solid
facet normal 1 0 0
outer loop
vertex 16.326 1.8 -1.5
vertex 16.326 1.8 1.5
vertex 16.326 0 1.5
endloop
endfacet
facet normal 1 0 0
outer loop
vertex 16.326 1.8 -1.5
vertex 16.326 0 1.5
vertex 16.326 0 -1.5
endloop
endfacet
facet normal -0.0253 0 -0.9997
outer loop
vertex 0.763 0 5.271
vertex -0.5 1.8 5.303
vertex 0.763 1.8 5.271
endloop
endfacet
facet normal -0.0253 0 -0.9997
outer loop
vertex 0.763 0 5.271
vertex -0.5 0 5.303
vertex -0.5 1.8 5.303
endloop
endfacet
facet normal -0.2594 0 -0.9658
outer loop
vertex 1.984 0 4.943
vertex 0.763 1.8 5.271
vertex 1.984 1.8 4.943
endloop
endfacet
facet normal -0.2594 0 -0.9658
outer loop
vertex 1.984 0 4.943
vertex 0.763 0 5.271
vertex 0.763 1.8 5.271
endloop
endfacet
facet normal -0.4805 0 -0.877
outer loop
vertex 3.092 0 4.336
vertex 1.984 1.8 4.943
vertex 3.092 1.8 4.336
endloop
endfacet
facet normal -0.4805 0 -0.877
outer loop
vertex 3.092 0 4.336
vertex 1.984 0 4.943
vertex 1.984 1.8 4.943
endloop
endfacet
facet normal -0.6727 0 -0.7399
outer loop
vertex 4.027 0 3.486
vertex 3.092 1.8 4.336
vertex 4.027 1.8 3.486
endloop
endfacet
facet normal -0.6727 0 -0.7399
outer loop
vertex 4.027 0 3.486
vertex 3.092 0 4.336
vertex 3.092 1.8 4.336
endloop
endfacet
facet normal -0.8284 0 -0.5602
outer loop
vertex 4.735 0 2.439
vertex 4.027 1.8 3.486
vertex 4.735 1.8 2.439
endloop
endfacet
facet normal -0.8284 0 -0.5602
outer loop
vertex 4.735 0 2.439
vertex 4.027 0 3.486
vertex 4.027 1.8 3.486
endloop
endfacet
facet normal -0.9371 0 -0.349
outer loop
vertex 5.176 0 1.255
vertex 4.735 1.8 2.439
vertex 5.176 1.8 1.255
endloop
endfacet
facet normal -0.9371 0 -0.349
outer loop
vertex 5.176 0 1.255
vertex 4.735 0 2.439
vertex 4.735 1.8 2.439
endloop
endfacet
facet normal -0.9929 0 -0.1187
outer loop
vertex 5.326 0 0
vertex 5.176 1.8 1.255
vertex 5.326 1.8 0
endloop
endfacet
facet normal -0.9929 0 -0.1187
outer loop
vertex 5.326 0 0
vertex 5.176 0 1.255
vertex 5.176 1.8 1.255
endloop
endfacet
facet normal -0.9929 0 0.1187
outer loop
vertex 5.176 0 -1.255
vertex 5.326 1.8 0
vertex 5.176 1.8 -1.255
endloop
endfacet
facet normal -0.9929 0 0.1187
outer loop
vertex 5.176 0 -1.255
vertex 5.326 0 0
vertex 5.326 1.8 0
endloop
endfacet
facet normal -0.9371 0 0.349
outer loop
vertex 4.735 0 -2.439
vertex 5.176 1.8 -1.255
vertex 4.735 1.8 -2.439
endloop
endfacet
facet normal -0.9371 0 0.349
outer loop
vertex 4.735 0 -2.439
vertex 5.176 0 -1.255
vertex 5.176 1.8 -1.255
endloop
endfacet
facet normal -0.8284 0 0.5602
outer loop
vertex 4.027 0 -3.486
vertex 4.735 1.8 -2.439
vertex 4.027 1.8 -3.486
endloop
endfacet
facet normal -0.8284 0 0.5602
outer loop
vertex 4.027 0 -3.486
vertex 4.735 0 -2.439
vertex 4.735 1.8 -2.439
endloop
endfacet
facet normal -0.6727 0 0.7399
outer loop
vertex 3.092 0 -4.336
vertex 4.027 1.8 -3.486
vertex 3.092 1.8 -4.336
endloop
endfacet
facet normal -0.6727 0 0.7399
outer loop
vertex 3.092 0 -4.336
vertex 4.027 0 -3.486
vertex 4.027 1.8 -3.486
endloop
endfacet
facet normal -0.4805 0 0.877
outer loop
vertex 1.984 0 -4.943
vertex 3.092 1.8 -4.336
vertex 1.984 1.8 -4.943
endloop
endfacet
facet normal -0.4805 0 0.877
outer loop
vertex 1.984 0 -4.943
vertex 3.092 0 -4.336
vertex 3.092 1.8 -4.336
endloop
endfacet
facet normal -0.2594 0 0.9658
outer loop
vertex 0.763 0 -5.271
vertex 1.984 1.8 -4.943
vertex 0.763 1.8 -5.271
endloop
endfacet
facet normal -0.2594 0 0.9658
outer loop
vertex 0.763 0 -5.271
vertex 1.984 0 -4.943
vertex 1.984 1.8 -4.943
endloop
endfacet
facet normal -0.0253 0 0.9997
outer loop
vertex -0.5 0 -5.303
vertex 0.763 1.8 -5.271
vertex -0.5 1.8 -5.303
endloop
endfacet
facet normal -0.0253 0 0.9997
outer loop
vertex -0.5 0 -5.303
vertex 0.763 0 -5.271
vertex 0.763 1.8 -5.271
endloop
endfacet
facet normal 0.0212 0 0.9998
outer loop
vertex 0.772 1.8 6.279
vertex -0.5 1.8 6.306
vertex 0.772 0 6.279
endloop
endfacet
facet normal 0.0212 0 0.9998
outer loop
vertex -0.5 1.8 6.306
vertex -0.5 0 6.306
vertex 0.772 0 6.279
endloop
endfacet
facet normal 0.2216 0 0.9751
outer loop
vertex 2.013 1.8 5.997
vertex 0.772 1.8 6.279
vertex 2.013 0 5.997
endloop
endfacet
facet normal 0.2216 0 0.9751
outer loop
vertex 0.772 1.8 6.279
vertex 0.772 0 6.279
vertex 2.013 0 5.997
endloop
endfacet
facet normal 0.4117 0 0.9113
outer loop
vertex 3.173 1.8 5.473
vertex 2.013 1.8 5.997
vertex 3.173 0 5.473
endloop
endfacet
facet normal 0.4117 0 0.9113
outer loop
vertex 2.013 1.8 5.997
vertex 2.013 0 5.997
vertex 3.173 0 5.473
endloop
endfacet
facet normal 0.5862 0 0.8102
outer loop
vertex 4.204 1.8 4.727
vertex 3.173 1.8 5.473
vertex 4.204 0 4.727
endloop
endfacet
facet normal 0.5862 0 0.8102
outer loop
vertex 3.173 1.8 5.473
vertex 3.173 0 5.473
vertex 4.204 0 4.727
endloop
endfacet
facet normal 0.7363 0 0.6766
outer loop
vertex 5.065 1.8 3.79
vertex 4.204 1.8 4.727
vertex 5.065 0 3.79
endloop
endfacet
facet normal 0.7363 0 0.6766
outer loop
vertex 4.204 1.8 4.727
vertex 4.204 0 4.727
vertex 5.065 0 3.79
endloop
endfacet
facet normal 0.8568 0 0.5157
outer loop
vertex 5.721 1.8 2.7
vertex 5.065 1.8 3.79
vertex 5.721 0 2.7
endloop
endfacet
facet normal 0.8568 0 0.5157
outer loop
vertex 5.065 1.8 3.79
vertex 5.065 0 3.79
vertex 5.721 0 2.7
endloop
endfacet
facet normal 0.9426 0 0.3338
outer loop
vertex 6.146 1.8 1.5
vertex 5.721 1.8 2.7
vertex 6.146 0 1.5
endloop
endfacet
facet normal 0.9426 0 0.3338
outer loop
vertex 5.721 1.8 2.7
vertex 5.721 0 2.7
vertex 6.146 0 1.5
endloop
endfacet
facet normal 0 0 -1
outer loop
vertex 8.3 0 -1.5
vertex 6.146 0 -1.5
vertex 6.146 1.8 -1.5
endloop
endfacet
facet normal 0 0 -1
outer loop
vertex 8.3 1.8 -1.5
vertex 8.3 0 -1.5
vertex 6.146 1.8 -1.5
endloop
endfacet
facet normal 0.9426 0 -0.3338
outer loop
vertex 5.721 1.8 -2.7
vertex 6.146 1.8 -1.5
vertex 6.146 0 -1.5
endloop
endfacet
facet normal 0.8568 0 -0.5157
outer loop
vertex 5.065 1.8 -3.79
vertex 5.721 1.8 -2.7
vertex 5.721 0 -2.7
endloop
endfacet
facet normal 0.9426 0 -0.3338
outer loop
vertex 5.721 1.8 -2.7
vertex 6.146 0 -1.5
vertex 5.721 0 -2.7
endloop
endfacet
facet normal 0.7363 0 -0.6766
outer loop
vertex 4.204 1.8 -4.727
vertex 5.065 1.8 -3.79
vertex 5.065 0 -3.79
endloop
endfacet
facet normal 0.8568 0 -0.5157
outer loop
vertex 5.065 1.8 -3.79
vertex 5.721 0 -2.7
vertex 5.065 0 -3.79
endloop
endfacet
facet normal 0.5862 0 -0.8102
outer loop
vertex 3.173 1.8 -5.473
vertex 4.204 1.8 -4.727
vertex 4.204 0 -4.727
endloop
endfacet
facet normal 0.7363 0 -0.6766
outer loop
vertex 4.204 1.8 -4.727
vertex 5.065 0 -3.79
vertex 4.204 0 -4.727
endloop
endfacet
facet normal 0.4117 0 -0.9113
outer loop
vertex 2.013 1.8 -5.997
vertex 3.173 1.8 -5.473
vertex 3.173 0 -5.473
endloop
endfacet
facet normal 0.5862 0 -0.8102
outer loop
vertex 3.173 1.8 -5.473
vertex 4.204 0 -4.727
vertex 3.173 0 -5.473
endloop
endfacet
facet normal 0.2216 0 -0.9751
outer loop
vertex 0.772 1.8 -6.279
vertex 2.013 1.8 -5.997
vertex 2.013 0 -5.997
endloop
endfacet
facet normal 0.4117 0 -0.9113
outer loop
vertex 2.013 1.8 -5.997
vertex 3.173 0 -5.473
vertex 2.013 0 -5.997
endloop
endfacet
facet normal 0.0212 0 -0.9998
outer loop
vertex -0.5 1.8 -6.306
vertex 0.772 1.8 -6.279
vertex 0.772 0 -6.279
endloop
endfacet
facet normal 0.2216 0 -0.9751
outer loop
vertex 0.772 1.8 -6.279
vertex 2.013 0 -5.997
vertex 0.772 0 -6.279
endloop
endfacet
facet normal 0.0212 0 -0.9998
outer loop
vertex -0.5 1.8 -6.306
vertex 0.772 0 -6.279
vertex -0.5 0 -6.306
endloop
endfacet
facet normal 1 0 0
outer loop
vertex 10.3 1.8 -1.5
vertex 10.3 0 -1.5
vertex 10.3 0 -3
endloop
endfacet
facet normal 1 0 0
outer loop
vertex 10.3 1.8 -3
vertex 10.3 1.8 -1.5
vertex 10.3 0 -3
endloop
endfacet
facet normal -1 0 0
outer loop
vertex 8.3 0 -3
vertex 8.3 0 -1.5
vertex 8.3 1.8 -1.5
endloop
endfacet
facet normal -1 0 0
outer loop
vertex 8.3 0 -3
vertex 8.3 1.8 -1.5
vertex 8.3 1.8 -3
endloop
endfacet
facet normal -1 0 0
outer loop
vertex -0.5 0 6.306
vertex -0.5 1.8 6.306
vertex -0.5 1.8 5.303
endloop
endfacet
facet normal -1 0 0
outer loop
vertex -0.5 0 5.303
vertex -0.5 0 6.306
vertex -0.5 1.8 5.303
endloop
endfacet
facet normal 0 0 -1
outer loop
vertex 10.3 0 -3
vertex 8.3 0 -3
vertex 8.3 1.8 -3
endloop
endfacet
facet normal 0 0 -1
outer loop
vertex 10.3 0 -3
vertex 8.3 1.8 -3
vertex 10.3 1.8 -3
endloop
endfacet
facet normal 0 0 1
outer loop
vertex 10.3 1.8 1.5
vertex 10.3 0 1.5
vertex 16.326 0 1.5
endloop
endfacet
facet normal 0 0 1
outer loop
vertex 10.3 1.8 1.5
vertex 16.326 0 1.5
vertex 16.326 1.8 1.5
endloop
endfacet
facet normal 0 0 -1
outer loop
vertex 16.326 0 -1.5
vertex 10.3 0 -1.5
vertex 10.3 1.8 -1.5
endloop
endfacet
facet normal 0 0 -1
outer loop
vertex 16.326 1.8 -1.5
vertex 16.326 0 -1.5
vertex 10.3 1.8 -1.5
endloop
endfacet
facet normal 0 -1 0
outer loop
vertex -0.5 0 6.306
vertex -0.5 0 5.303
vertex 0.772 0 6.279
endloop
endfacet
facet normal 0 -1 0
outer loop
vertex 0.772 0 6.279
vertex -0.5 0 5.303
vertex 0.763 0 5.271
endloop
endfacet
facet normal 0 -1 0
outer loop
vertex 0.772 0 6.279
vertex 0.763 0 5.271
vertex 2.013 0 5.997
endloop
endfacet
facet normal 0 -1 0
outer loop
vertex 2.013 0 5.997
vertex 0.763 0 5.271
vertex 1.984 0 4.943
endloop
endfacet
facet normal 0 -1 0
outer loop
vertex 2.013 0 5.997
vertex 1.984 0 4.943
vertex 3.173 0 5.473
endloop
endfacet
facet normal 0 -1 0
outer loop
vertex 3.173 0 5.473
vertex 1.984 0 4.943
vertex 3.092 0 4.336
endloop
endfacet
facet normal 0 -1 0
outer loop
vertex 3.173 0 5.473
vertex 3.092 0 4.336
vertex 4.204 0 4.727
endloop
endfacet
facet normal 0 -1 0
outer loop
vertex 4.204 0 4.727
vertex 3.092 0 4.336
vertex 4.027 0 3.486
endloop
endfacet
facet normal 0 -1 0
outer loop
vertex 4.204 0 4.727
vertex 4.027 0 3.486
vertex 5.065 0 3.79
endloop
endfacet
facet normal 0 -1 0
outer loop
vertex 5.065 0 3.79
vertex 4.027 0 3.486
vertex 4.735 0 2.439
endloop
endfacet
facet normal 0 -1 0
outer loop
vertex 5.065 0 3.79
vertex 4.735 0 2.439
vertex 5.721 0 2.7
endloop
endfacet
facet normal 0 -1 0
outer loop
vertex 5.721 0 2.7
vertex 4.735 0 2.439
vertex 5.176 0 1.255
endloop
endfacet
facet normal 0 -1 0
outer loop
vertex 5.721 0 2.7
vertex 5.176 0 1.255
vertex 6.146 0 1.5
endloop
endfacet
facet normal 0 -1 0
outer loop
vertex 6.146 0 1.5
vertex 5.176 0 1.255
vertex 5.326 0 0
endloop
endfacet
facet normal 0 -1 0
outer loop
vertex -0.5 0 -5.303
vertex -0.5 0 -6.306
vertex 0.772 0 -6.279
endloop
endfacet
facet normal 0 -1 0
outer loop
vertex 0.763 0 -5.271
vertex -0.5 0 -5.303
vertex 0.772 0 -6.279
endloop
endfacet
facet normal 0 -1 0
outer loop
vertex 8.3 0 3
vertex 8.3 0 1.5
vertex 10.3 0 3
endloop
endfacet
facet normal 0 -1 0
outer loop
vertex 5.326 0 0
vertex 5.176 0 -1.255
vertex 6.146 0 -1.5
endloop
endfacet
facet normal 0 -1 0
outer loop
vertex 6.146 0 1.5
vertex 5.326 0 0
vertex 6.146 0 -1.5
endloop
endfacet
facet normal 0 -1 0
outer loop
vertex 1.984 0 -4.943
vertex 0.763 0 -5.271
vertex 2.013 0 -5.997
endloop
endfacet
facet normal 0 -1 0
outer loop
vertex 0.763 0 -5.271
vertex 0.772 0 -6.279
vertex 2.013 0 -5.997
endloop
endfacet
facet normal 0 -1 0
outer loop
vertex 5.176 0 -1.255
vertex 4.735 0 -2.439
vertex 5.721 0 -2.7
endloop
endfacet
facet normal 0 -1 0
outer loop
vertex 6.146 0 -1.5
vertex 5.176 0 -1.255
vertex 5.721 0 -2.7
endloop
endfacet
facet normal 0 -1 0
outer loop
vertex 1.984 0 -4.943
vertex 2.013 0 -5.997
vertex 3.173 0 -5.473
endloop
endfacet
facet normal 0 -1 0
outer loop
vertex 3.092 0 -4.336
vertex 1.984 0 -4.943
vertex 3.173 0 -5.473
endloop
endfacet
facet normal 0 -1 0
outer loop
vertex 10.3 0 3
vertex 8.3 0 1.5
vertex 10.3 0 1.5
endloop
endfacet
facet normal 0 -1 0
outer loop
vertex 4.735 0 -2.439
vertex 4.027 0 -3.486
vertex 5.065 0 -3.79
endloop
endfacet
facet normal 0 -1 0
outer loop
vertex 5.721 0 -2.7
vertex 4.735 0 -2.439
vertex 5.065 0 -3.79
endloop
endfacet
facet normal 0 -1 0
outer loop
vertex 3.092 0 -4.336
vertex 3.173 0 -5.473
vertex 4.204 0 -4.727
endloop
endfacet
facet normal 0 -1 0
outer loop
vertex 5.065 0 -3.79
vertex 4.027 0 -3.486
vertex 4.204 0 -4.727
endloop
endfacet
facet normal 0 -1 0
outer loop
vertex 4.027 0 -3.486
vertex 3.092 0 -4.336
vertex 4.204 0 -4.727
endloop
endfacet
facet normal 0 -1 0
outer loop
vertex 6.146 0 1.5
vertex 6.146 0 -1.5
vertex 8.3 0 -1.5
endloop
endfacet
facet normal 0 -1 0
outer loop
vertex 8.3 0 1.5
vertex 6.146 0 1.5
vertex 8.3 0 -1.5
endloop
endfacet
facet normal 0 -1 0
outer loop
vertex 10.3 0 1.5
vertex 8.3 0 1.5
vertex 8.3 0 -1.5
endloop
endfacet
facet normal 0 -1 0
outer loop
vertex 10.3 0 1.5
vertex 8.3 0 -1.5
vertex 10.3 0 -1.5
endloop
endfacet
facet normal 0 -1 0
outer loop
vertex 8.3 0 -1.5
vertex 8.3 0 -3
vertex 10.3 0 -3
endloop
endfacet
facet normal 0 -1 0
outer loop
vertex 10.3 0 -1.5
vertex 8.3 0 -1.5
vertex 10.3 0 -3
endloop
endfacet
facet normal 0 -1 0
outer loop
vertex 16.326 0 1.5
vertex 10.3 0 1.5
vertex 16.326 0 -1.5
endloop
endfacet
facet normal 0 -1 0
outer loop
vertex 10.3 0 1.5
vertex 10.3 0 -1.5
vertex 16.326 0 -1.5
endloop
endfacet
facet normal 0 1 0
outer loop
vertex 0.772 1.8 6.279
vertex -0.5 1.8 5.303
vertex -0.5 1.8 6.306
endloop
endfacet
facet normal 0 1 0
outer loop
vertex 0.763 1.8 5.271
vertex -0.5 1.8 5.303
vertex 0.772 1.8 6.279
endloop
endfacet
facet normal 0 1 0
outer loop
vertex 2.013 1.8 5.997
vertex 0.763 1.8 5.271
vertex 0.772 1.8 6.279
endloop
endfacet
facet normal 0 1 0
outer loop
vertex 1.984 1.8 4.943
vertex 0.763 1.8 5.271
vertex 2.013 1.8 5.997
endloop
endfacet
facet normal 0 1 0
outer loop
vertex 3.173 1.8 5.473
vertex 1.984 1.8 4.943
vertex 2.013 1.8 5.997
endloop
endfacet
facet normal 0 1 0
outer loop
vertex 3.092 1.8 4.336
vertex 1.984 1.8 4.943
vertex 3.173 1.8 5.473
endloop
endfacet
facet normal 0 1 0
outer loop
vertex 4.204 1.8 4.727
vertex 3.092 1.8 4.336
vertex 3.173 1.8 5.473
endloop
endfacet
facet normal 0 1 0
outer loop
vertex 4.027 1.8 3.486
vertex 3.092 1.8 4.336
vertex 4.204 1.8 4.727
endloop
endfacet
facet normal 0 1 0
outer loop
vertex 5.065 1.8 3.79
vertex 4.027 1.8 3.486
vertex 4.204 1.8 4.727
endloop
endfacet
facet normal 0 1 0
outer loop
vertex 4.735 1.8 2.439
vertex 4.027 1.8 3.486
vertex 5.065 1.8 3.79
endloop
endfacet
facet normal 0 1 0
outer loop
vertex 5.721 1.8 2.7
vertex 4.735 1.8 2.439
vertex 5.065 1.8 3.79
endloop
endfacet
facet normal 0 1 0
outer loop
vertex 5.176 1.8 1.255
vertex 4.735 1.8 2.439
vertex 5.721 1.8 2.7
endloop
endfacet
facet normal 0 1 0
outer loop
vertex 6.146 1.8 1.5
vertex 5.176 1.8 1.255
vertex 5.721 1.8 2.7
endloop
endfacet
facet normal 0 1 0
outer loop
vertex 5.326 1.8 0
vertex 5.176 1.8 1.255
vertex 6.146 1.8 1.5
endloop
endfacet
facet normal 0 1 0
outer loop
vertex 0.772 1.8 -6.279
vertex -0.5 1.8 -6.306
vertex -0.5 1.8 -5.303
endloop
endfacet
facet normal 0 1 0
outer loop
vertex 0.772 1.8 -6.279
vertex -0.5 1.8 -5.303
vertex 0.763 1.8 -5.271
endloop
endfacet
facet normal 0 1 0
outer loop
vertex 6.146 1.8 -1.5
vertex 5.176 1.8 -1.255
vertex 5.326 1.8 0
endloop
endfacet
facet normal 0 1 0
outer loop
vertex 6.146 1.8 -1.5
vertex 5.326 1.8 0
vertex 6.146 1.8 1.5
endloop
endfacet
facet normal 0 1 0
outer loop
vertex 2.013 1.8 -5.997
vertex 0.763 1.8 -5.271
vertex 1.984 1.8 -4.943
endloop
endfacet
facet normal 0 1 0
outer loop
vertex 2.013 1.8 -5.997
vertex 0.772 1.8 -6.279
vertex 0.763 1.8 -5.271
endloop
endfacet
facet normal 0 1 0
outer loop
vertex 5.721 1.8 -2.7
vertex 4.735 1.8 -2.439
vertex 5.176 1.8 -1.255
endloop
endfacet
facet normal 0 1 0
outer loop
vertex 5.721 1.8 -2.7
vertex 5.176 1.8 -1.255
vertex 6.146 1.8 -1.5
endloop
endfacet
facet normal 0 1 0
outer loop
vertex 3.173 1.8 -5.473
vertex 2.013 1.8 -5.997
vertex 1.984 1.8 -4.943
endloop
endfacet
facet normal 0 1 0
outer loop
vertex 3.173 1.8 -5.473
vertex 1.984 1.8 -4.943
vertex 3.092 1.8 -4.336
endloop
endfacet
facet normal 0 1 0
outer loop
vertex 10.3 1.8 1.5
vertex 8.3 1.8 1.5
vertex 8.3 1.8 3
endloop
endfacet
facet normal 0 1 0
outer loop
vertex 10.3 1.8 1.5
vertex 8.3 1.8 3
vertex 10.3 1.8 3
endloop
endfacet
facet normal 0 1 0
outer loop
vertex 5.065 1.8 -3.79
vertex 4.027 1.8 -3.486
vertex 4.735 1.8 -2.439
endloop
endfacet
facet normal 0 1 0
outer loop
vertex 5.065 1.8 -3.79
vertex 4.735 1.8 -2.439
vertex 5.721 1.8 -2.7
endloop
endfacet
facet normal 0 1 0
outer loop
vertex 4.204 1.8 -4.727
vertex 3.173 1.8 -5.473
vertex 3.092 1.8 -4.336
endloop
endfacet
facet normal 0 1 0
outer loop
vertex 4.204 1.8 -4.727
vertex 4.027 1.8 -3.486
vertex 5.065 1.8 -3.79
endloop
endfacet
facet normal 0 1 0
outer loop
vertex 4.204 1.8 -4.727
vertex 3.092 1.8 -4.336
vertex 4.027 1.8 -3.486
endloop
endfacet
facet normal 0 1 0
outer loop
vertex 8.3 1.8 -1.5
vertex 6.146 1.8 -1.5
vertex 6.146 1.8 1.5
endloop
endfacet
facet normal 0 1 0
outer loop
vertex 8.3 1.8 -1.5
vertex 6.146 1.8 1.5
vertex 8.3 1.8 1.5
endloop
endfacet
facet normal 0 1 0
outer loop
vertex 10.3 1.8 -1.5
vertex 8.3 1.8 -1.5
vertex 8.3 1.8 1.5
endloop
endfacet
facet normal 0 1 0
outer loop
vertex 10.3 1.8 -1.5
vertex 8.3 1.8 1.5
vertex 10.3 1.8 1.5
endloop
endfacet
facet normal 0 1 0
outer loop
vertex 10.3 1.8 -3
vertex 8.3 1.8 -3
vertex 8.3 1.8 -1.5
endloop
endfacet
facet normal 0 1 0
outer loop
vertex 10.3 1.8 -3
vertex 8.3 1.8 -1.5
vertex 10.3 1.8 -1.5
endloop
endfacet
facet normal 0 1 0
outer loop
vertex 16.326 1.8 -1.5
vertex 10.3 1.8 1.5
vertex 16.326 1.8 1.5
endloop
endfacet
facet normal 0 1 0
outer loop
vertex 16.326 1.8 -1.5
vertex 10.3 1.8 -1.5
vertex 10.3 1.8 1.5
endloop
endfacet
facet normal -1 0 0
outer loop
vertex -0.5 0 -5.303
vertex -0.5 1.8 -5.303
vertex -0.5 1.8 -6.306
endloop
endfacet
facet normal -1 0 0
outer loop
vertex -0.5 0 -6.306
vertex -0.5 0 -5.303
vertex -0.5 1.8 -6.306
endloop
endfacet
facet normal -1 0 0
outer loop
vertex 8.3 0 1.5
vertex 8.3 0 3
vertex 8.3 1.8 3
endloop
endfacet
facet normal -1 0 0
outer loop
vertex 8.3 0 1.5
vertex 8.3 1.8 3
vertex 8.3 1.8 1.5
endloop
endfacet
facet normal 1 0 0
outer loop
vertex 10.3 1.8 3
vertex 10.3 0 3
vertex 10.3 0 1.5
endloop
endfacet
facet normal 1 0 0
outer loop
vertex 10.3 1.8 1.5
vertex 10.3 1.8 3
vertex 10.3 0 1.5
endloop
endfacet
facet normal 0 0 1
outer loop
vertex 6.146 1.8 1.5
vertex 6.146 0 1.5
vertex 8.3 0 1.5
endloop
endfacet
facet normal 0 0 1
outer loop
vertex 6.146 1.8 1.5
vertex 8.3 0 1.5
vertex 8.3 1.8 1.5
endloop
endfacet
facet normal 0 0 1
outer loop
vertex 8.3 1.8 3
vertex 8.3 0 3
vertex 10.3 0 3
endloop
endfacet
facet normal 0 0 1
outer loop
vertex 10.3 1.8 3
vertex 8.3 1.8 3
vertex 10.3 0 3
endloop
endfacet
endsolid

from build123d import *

# Parameters (mm, degrees)
SKETCH_1_R           = 6.326152672
SKETCH_1_R_2         = 5.326152672
EXTRUDE_1_DEPTH      = 1.8
EXTRUDE_2_DEPTH      = 10
EXTRUDE_2_DEPTH_BACK = 0.5
SKETCH_2_W           = 3
SKETCH_2_H           = 1.8
CUT_EXTRUDE_1_REACH  = 19.601
SKETCH_3_W           = 6.461960394
SKETCH_3_H           = 15
EXTRUDE_START        = -1.8
SKETCH_4_W           = 2
SKETCH_4_H           = 6
EXTRUDE_3_DEPTH      = 1.8


with BuildPart() as part:
    # 草图1 → 凸台-拉伸1 (new body)
    with BuildSketch(Plane(origin=(0, 0, 0), x_dir=(1, 0, 0), z_dir=(0, 1, 0))):
        with Locations(Location((0, 0, 0), (0, 0, 270))):
            Circle(SKETCH_1_R)
        with Locations(Location((0, 0, 0), (0, 0, 270))):
            Circle(SKETCH_1_R_2, mode=Mode.SUBTRACT)
    extrude(amount=EXTRUDE_1_DEPTH)

    # 草图2 → 凸台-拉伸2 (add, two sides: drawn at the far end of the back side and taken through both)
    with BuildSketch(Plane(origin=(6.326152672, 0, 0), x_dir=(0, 0, -1), z_dir=(1, 0, 0)).offset(-EXTRUDE_2_DEPTH_BACK)):
        with Locations((0, 0.9)):
            Rectangle(SKETCH_2_W, SKETCH_2_H)
    extrude(amount=EXTRUDE_2_DEPTH + EXTRUDE_2_DEPTH_BACK)

    # 草图3 → 切除-拉伸1 (cut, up to next)
    with BuildSketch(Plane(origin=(0, 1.8, 0), x_dir=(1, 0, 0), z_dir=(0, 1, 0)), mode=Mode.PRIVATE) as cut_extrude_1_sk1:
        with Locations((-3.730980197, 0.039566398)):
            Rectangle(SKETCH_3_W, SKETCH_3_H)
    cut_extrude_1_tool1 = extrude(cut_extrude_1_sk1.sketch, amount=-CUT_EXTRUDE_1_REACH, mode=Mode.PRIVATE) & part.part
    add(cut_extrude_1_tool1.solids().sort_by_distance((-3.73098, 1.8, -0.039566))[0], mode=Mode.SUBTRACT)

    # 草图4 → 凸台-拉伸3 (add)
    with BuildSketch(Plane(origin=(0, 1.8, 0), x_dir=(1, 0, 0), z_dir=(0, 1, 0)).offset(EXTRUDE_START)):
        with Locations((9.3, 0)):
            Rectangle(SKETCH_4_W, SKETCH_4_H)
    extrude(amount=EXTRUDE_3_DEPTH)


solid = part.part
